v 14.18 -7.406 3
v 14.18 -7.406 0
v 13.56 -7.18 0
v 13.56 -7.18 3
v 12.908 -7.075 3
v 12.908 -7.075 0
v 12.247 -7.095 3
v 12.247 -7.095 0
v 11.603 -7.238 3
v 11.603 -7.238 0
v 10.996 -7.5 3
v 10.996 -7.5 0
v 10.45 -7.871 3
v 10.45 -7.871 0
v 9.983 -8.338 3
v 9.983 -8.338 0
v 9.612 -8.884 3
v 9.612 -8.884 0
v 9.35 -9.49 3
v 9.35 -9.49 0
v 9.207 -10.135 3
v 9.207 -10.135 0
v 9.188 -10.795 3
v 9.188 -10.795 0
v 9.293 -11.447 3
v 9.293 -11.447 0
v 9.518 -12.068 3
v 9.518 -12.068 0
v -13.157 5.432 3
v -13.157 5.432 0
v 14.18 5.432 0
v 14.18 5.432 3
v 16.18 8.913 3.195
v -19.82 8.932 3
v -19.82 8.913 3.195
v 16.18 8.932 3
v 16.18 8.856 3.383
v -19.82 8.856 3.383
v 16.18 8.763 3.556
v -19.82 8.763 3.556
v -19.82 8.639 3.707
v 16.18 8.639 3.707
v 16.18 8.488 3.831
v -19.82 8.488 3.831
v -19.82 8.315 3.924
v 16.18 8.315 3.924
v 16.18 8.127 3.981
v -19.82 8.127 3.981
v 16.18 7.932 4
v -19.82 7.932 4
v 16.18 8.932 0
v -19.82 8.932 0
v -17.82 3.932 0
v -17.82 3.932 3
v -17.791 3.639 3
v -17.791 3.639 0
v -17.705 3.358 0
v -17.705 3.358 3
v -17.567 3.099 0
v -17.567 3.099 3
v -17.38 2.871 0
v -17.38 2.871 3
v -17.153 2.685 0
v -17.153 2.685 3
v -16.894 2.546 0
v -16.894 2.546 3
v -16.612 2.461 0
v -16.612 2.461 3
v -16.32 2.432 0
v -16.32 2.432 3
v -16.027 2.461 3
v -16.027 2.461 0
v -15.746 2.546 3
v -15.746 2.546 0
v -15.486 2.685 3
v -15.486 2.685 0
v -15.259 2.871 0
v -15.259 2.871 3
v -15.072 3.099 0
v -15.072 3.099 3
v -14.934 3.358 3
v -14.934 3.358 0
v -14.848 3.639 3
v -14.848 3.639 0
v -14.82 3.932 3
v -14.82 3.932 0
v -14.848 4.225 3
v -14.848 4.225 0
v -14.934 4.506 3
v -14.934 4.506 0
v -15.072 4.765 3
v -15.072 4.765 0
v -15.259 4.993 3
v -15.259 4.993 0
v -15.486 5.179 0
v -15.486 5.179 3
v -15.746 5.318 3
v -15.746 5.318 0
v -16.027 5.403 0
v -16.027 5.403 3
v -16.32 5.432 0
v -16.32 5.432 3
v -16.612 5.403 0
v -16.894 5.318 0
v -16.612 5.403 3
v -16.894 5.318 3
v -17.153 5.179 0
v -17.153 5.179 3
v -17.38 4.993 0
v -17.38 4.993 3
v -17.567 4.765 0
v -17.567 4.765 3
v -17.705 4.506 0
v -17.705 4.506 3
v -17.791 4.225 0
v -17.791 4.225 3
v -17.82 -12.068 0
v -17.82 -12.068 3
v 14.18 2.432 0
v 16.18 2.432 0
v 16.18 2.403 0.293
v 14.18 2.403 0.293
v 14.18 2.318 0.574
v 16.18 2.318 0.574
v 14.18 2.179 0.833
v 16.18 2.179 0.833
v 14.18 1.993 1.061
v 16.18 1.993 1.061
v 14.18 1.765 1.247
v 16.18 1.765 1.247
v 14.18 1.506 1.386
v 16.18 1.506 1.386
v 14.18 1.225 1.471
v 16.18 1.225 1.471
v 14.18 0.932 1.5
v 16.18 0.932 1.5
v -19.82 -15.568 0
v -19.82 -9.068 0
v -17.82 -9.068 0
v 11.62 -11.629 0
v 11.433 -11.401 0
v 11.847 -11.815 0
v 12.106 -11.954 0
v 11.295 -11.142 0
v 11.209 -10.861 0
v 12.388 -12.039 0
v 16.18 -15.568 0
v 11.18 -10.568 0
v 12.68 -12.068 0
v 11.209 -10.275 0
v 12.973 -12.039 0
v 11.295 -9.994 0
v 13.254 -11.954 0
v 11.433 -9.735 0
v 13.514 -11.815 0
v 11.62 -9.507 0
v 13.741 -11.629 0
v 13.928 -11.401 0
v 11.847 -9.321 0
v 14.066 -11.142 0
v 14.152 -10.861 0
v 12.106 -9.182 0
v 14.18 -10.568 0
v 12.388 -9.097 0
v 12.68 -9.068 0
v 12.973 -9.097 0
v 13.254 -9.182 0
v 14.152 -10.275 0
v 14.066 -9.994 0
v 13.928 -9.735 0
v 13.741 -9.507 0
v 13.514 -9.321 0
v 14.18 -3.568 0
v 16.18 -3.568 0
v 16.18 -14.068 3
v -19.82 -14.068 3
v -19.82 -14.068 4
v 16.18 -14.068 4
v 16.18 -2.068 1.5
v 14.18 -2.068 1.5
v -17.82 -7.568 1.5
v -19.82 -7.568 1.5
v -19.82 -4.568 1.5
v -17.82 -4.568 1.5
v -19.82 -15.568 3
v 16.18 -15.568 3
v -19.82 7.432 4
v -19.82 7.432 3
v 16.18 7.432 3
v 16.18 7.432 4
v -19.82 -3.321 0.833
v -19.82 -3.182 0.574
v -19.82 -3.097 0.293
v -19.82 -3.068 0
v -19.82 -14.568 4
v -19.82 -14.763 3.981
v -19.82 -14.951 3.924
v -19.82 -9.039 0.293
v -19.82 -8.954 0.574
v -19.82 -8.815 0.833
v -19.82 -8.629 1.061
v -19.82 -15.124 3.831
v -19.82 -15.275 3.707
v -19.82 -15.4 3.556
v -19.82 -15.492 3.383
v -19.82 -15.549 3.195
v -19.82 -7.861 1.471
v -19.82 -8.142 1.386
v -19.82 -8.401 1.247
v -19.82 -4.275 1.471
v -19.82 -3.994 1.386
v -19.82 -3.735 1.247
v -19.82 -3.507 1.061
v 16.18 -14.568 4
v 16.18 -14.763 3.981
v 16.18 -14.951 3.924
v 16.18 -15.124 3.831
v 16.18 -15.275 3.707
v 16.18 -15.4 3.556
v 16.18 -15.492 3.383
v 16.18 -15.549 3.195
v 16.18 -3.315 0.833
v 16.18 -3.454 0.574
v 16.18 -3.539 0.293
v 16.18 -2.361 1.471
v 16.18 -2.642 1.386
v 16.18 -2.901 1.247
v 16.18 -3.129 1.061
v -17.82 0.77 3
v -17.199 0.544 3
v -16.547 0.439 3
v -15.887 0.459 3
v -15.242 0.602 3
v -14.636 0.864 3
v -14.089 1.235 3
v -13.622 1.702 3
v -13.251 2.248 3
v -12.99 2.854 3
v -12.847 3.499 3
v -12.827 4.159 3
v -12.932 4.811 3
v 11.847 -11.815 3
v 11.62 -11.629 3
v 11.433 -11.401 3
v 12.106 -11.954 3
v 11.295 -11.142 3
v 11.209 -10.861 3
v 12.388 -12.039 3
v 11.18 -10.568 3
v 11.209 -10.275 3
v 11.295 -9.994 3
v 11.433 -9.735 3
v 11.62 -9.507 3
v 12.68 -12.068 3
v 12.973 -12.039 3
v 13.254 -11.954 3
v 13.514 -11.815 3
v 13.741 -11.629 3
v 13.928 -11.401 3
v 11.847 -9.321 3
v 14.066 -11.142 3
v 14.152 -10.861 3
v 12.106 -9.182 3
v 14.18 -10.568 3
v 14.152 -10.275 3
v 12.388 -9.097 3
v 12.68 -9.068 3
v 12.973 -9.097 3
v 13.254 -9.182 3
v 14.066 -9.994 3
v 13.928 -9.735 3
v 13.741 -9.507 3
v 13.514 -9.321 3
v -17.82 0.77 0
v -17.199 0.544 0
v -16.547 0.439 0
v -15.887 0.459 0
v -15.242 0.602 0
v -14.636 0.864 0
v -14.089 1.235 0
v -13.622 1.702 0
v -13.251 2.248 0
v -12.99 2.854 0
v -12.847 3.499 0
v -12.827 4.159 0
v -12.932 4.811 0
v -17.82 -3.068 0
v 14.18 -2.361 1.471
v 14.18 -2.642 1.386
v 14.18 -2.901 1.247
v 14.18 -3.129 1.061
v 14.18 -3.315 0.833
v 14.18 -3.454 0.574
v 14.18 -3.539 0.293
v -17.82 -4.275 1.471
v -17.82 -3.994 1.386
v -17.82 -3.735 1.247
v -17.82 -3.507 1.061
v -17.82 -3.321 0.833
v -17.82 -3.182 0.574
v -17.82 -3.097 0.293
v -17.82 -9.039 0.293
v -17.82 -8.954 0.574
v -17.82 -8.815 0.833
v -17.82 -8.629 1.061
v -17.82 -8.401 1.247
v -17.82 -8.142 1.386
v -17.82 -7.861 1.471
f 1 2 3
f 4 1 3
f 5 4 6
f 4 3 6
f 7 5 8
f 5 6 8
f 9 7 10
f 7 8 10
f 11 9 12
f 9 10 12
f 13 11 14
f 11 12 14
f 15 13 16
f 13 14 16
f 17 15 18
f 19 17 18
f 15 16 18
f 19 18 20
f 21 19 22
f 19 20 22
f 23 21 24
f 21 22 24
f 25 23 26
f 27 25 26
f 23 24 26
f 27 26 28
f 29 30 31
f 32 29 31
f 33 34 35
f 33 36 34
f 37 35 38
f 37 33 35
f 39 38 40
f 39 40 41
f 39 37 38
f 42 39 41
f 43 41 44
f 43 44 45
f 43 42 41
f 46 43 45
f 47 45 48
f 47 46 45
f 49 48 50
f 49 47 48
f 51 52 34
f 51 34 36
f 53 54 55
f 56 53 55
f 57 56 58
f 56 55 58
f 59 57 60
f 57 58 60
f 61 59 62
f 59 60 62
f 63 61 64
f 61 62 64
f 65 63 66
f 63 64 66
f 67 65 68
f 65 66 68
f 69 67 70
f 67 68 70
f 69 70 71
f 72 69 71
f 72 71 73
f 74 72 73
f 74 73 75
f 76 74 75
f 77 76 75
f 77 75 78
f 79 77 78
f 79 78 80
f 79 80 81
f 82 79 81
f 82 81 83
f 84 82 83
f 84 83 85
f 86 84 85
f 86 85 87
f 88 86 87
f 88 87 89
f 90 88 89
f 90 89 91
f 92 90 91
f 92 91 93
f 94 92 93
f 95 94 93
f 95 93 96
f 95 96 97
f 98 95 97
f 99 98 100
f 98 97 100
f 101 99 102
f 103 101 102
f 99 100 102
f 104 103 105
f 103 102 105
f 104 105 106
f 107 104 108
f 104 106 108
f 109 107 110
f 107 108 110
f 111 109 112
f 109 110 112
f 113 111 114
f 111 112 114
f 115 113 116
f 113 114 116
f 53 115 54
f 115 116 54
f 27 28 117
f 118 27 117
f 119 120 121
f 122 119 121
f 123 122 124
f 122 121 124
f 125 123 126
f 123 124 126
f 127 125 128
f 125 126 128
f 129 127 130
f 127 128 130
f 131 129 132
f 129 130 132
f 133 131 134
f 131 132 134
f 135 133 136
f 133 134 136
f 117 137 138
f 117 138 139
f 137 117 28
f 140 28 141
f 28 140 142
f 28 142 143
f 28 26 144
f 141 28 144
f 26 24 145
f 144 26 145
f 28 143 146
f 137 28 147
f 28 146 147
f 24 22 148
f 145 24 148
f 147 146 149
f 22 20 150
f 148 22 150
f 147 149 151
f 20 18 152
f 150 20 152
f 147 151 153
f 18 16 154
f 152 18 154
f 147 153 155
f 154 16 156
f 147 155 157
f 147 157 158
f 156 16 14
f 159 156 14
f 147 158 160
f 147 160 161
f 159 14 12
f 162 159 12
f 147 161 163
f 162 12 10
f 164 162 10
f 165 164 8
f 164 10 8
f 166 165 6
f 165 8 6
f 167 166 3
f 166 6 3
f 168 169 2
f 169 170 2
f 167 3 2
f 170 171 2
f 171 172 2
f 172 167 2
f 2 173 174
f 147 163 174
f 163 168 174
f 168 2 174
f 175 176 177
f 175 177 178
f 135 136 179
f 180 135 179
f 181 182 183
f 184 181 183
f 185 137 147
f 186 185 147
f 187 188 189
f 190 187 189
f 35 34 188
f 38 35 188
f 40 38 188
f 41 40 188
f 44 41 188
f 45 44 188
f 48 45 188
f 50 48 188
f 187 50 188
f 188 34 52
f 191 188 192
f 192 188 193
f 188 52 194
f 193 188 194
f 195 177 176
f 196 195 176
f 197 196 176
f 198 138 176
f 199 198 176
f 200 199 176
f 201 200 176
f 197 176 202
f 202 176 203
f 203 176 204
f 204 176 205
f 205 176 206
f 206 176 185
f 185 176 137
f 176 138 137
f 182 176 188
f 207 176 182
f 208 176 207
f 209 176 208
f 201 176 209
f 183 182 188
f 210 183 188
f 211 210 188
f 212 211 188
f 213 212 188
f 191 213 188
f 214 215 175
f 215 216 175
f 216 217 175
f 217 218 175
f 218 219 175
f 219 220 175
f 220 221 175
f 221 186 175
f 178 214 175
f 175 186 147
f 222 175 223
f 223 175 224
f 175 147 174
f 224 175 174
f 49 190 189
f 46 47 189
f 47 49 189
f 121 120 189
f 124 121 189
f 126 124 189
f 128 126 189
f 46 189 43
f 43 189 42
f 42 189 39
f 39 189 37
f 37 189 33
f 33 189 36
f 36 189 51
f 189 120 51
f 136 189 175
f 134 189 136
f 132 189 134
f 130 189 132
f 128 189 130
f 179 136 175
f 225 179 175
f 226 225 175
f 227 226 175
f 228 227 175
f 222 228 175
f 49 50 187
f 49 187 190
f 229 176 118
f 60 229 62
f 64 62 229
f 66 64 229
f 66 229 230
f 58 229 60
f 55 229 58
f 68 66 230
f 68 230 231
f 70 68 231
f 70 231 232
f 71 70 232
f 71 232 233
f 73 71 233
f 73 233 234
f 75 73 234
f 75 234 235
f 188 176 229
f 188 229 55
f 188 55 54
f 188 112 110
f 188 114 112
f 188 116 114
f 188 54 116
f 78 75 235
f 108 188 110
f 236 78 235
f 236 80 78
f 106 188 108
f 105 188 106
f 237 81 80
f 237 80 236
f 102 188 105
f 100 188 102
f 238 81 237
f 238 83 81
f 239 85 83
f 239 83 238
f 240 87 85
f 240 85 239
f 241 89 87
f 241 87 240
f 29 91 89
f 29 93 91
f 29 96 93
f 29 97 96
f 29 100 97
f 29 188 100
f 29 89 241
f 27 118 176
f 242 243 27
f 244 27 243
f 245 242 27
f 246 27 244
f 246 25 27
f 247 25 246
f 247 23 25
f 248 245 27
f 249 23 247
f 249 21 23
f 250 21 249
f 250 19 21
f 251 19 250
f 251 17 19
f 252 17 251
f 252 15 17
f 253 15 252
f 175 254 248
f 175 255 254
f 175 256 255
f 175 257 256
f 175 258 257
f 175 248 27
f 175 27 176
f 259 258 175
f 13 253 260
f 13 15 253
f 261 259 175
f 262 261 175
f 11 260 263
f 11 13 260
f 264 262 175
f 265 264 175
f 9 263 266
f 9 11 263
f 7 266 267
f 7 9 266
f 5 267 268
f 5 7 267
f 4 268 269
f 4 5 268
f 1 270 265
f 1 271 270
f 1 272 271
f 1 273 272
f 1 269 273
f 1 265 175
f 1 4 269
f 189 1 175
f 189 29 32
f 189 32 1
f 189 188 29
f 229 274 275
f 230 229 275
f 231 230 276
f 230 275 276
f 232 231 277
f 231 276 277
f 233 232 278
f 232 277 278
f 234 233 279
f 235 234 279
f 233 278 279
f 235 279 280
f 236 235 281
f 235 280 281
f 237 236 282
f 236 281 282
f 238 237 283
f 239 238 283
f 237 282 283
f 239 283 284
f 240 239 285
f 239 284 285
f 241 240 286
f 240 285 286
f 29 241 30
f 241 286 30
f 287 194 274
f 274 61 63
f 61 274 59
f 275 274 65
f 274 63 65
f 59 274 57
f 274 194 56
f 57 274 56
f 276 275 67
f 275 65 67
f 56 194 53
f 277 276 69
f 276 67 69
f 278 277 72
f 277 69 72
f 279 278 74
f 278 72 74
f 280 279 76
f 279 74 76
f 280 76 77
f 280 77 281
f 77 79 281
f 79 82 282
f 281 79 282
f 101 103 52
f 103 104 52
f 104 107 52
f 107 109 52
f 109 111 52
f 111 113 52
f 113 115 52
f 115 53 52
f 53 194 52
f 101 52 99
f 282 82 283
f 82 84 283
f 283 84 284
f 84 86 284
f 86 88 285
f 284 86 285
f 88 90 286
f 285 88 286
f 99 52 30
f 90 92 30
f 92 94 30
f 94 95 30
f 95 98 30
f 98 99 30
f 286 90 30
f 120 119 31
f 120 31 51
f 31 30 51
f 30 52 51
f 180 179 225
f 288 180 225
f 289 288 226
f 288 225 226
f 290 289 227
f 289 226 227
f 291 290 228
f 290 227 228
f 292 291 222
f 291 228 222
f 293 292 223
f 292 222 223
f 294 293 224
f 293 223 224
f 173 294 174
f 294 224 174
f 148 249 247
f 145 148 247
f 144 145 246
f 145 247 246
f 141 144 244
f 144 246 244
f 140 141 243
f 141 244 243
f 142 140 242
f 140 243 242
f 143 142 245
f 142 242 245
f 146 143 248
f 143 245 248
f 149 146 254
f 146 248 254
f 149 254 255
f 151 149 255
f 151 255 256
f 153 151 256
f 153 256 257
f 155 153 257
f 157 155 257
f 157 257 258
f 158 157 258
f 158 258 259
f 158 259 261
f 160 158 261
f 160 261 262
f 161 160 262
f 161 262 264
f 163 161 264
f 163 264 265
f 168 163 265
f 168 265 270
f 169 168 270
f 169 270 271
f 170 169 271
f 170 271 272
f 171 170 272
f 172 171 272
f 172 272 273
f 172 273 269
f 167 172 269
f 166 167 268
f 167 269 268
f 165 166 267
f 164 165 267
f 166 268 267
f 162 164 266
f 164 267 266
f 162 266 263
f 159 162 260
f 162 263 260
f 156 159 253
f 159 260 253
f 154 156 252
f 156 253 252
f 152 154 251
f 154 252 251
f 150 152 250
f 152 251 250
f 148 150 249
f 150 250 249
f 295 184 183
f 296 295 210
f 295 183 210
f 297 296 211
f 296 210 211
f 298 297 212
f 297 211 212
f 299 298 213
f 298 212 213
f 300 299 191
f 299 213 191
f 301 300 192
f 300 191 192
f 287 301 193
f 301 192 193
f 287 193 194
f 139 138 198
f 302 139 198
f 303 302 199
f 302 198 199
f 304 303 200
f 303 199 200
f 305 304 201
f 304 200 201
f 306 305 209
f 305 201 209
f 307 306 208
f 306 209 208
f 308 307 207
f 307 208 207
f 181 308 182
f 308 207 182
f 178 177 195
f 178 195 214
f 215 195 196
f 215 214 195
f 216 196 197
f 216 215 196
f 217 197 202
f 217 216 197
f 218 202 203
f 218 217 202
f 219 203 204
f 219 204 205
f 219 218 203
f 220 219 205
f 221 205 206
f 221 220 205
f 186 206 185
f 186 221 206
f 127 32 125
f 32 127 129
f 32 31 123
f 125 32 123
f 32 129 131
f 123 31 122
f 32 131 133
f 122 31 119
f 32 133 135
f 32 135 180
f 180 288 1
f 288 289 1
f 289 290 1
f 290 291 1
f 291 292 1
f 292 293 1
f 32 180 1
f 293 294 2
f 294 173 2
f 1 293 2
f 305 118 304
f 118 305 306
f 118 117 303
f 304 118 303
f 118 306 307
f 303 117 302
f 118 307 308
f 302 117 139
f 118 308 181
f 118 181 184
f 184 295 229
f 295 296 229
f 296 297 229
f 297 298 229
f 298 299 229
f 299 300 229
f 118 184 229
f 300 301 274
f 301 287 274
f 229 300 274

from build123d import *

# Parameters (mm, degrees)
F0_W     = 36
F0_H     = 1.5
F0_H_2   = 21.5
F1_DEPTH = 3
F2_DEPTH = 4
F3_D     = 3
F3_DEPTH = 8
F3_TIP   = 0.9012909285
F4_R     = 1
F6_DEPTH = 25
F8_DEPTH = 25


with BuildPart() as f1:
    # F0 (on Top) → F1 (new body)
    with BuildSketch(Plane.XY):
        with Locations((-1.819640398, 8.1819643453)):
            Rectangle(F0_W, F0_H)
        with Locations((-1.819640398, -3.3180356547)):
            Rectangle(F0_W, F0_H_2)
        with BuildLine():
            ThreePointArc((-17.819640398, 0.7696866851), (-13.8447666639, 1.4570906111), (-13.1573627379, 5.4319643453))
            Line((-13.1573627379, 5.4319643453), (14.180359602, 5.4319643453))
            Line((14.180359602, 5.4319643453), (14.180359602, -7.4057579946))
            ThreePointArc((14.180359602, -7.4057579946), (10.2054858678, -8.0931619206), (9.5180819418, -12.0680356547))
            Line((9.5180819418, -12.0680356547), (-17.819640398, -12.0680356547))
            Line((-17.819640398, -12.0680356547), (-17.819640398, 0.7696866851))
        make_face(mode=Mode.SUBTRACT)
        with Locations((-1.819640398, -14.8180356547)):
            Rectangle(F0_W, F0_H)
    extrude(amount=F1_DEPTH)

    # F0 (on Top) → F2 (join)
    with BuildSketch(Plane.XY):
        with Locations((-1.819640398, 8.1819643453)):
            Rectangle(F0_W, F0_H)
        with Locations((-1.819640398, -14.8180356547)):
            Rectangle(F0_W, F0_H)
    extrude(amount=F2_DEPTH)

    # F3
    with Locations(Plane(origin=(0, 0, 0), x_dir=(1, 0, 0), z_dir=(0, 0, -1))):
        with Locations((12.680359602, 10.5680356547), (-16.319640398, -3.9319643453)):
            Hole(F3_D / 2, depth=F3_DEPTH)
            with Locations((0, 0, -(F3_DEPTH + F3_TIP / 2))):  # 118° drill point
                Cone(0, F3_D / 2, F3_TIP, mode=Mode.SUBTRACT)

    # F4
    f4_edges = [f1.edges().sort_by_distance(p)[0] for p in [
        (-1.81964, 8.931964, 4),
        (-1.81964, -15.568036, 4),
    ]]
    fillet(f4_edges, radius=F4_R)

    # F5 (on face) → F6 (cut)
    with BuildSketch(Plane(origin=(-19.819640398, 0, 0), x_dir=(0, -1, 0), z_dir=(-1, 0, 0))):
        with BuildLine():
            Line((7.5680356547, 1.5), (4.5680356547, 1.5))
            ThreePointArc((4.5680356547, 1.5), (3.1191469153, -0.3882285677), (5.3180356547, -1.2990381057))
            ThreePointArc((5.3180356547, -1.2990381057), (6.0680356547, -1.5), (6.8180356547, -1.2990381057))
            ThreePointArc((6.8180356547, -1.2990381057), (9.0169243942, -0.3882285677), (7.5680356547, 1.5))
        make_face()
    extrude(amount=-F6_DEPTH, mode=Mode.SUBTRACT)

    # F7 (on face) → F8 (cut)
    with BuildSketch(Plane.YZ.offset(16.180359602)):
        with BuildLine():
            ThreePointArc((-0.5680356547, 0), (0.9319643453, -1.5), (2.4319643453, 0))
            ThreePointArc((2.4319643453, 0), (1.9926245171, 1.0606601718), (0.9319643453, 1.5))
            ThreePointArc((0.9319643453, 1.5), (-0.1286958265, 1.0606601718), (-0.5680356547, 0))
        make_face()
        with BuildLine():
            ThreePointArc((-0.5680356547, 0), (-0.1286958265, 1.0606601718), (0.9319643453, 1.5))
            Line((0.9319643453, 1.5), (-2.0680356547, 1.5))
            ThreePointArc((-2.0680356547, 1.5), (-1.0073754829, 1.0606601718), (-0.5680356547, 0))
        make_face()
        with BuildLine():
            ThreePointArc((-2.0680356547, 1.5), (-3.1286958265, -1.0606601718), (-0.5680356547, 0))
            ThreePointArc((-0.5680356547, 0), (-1.0073754829, 1.0606601718), (-2.0680356547, 1.5))
        make_face()
    extrude(amount=-F8_DEPTH, mode=Mode.SUBTRACT)


solid = f1.part
